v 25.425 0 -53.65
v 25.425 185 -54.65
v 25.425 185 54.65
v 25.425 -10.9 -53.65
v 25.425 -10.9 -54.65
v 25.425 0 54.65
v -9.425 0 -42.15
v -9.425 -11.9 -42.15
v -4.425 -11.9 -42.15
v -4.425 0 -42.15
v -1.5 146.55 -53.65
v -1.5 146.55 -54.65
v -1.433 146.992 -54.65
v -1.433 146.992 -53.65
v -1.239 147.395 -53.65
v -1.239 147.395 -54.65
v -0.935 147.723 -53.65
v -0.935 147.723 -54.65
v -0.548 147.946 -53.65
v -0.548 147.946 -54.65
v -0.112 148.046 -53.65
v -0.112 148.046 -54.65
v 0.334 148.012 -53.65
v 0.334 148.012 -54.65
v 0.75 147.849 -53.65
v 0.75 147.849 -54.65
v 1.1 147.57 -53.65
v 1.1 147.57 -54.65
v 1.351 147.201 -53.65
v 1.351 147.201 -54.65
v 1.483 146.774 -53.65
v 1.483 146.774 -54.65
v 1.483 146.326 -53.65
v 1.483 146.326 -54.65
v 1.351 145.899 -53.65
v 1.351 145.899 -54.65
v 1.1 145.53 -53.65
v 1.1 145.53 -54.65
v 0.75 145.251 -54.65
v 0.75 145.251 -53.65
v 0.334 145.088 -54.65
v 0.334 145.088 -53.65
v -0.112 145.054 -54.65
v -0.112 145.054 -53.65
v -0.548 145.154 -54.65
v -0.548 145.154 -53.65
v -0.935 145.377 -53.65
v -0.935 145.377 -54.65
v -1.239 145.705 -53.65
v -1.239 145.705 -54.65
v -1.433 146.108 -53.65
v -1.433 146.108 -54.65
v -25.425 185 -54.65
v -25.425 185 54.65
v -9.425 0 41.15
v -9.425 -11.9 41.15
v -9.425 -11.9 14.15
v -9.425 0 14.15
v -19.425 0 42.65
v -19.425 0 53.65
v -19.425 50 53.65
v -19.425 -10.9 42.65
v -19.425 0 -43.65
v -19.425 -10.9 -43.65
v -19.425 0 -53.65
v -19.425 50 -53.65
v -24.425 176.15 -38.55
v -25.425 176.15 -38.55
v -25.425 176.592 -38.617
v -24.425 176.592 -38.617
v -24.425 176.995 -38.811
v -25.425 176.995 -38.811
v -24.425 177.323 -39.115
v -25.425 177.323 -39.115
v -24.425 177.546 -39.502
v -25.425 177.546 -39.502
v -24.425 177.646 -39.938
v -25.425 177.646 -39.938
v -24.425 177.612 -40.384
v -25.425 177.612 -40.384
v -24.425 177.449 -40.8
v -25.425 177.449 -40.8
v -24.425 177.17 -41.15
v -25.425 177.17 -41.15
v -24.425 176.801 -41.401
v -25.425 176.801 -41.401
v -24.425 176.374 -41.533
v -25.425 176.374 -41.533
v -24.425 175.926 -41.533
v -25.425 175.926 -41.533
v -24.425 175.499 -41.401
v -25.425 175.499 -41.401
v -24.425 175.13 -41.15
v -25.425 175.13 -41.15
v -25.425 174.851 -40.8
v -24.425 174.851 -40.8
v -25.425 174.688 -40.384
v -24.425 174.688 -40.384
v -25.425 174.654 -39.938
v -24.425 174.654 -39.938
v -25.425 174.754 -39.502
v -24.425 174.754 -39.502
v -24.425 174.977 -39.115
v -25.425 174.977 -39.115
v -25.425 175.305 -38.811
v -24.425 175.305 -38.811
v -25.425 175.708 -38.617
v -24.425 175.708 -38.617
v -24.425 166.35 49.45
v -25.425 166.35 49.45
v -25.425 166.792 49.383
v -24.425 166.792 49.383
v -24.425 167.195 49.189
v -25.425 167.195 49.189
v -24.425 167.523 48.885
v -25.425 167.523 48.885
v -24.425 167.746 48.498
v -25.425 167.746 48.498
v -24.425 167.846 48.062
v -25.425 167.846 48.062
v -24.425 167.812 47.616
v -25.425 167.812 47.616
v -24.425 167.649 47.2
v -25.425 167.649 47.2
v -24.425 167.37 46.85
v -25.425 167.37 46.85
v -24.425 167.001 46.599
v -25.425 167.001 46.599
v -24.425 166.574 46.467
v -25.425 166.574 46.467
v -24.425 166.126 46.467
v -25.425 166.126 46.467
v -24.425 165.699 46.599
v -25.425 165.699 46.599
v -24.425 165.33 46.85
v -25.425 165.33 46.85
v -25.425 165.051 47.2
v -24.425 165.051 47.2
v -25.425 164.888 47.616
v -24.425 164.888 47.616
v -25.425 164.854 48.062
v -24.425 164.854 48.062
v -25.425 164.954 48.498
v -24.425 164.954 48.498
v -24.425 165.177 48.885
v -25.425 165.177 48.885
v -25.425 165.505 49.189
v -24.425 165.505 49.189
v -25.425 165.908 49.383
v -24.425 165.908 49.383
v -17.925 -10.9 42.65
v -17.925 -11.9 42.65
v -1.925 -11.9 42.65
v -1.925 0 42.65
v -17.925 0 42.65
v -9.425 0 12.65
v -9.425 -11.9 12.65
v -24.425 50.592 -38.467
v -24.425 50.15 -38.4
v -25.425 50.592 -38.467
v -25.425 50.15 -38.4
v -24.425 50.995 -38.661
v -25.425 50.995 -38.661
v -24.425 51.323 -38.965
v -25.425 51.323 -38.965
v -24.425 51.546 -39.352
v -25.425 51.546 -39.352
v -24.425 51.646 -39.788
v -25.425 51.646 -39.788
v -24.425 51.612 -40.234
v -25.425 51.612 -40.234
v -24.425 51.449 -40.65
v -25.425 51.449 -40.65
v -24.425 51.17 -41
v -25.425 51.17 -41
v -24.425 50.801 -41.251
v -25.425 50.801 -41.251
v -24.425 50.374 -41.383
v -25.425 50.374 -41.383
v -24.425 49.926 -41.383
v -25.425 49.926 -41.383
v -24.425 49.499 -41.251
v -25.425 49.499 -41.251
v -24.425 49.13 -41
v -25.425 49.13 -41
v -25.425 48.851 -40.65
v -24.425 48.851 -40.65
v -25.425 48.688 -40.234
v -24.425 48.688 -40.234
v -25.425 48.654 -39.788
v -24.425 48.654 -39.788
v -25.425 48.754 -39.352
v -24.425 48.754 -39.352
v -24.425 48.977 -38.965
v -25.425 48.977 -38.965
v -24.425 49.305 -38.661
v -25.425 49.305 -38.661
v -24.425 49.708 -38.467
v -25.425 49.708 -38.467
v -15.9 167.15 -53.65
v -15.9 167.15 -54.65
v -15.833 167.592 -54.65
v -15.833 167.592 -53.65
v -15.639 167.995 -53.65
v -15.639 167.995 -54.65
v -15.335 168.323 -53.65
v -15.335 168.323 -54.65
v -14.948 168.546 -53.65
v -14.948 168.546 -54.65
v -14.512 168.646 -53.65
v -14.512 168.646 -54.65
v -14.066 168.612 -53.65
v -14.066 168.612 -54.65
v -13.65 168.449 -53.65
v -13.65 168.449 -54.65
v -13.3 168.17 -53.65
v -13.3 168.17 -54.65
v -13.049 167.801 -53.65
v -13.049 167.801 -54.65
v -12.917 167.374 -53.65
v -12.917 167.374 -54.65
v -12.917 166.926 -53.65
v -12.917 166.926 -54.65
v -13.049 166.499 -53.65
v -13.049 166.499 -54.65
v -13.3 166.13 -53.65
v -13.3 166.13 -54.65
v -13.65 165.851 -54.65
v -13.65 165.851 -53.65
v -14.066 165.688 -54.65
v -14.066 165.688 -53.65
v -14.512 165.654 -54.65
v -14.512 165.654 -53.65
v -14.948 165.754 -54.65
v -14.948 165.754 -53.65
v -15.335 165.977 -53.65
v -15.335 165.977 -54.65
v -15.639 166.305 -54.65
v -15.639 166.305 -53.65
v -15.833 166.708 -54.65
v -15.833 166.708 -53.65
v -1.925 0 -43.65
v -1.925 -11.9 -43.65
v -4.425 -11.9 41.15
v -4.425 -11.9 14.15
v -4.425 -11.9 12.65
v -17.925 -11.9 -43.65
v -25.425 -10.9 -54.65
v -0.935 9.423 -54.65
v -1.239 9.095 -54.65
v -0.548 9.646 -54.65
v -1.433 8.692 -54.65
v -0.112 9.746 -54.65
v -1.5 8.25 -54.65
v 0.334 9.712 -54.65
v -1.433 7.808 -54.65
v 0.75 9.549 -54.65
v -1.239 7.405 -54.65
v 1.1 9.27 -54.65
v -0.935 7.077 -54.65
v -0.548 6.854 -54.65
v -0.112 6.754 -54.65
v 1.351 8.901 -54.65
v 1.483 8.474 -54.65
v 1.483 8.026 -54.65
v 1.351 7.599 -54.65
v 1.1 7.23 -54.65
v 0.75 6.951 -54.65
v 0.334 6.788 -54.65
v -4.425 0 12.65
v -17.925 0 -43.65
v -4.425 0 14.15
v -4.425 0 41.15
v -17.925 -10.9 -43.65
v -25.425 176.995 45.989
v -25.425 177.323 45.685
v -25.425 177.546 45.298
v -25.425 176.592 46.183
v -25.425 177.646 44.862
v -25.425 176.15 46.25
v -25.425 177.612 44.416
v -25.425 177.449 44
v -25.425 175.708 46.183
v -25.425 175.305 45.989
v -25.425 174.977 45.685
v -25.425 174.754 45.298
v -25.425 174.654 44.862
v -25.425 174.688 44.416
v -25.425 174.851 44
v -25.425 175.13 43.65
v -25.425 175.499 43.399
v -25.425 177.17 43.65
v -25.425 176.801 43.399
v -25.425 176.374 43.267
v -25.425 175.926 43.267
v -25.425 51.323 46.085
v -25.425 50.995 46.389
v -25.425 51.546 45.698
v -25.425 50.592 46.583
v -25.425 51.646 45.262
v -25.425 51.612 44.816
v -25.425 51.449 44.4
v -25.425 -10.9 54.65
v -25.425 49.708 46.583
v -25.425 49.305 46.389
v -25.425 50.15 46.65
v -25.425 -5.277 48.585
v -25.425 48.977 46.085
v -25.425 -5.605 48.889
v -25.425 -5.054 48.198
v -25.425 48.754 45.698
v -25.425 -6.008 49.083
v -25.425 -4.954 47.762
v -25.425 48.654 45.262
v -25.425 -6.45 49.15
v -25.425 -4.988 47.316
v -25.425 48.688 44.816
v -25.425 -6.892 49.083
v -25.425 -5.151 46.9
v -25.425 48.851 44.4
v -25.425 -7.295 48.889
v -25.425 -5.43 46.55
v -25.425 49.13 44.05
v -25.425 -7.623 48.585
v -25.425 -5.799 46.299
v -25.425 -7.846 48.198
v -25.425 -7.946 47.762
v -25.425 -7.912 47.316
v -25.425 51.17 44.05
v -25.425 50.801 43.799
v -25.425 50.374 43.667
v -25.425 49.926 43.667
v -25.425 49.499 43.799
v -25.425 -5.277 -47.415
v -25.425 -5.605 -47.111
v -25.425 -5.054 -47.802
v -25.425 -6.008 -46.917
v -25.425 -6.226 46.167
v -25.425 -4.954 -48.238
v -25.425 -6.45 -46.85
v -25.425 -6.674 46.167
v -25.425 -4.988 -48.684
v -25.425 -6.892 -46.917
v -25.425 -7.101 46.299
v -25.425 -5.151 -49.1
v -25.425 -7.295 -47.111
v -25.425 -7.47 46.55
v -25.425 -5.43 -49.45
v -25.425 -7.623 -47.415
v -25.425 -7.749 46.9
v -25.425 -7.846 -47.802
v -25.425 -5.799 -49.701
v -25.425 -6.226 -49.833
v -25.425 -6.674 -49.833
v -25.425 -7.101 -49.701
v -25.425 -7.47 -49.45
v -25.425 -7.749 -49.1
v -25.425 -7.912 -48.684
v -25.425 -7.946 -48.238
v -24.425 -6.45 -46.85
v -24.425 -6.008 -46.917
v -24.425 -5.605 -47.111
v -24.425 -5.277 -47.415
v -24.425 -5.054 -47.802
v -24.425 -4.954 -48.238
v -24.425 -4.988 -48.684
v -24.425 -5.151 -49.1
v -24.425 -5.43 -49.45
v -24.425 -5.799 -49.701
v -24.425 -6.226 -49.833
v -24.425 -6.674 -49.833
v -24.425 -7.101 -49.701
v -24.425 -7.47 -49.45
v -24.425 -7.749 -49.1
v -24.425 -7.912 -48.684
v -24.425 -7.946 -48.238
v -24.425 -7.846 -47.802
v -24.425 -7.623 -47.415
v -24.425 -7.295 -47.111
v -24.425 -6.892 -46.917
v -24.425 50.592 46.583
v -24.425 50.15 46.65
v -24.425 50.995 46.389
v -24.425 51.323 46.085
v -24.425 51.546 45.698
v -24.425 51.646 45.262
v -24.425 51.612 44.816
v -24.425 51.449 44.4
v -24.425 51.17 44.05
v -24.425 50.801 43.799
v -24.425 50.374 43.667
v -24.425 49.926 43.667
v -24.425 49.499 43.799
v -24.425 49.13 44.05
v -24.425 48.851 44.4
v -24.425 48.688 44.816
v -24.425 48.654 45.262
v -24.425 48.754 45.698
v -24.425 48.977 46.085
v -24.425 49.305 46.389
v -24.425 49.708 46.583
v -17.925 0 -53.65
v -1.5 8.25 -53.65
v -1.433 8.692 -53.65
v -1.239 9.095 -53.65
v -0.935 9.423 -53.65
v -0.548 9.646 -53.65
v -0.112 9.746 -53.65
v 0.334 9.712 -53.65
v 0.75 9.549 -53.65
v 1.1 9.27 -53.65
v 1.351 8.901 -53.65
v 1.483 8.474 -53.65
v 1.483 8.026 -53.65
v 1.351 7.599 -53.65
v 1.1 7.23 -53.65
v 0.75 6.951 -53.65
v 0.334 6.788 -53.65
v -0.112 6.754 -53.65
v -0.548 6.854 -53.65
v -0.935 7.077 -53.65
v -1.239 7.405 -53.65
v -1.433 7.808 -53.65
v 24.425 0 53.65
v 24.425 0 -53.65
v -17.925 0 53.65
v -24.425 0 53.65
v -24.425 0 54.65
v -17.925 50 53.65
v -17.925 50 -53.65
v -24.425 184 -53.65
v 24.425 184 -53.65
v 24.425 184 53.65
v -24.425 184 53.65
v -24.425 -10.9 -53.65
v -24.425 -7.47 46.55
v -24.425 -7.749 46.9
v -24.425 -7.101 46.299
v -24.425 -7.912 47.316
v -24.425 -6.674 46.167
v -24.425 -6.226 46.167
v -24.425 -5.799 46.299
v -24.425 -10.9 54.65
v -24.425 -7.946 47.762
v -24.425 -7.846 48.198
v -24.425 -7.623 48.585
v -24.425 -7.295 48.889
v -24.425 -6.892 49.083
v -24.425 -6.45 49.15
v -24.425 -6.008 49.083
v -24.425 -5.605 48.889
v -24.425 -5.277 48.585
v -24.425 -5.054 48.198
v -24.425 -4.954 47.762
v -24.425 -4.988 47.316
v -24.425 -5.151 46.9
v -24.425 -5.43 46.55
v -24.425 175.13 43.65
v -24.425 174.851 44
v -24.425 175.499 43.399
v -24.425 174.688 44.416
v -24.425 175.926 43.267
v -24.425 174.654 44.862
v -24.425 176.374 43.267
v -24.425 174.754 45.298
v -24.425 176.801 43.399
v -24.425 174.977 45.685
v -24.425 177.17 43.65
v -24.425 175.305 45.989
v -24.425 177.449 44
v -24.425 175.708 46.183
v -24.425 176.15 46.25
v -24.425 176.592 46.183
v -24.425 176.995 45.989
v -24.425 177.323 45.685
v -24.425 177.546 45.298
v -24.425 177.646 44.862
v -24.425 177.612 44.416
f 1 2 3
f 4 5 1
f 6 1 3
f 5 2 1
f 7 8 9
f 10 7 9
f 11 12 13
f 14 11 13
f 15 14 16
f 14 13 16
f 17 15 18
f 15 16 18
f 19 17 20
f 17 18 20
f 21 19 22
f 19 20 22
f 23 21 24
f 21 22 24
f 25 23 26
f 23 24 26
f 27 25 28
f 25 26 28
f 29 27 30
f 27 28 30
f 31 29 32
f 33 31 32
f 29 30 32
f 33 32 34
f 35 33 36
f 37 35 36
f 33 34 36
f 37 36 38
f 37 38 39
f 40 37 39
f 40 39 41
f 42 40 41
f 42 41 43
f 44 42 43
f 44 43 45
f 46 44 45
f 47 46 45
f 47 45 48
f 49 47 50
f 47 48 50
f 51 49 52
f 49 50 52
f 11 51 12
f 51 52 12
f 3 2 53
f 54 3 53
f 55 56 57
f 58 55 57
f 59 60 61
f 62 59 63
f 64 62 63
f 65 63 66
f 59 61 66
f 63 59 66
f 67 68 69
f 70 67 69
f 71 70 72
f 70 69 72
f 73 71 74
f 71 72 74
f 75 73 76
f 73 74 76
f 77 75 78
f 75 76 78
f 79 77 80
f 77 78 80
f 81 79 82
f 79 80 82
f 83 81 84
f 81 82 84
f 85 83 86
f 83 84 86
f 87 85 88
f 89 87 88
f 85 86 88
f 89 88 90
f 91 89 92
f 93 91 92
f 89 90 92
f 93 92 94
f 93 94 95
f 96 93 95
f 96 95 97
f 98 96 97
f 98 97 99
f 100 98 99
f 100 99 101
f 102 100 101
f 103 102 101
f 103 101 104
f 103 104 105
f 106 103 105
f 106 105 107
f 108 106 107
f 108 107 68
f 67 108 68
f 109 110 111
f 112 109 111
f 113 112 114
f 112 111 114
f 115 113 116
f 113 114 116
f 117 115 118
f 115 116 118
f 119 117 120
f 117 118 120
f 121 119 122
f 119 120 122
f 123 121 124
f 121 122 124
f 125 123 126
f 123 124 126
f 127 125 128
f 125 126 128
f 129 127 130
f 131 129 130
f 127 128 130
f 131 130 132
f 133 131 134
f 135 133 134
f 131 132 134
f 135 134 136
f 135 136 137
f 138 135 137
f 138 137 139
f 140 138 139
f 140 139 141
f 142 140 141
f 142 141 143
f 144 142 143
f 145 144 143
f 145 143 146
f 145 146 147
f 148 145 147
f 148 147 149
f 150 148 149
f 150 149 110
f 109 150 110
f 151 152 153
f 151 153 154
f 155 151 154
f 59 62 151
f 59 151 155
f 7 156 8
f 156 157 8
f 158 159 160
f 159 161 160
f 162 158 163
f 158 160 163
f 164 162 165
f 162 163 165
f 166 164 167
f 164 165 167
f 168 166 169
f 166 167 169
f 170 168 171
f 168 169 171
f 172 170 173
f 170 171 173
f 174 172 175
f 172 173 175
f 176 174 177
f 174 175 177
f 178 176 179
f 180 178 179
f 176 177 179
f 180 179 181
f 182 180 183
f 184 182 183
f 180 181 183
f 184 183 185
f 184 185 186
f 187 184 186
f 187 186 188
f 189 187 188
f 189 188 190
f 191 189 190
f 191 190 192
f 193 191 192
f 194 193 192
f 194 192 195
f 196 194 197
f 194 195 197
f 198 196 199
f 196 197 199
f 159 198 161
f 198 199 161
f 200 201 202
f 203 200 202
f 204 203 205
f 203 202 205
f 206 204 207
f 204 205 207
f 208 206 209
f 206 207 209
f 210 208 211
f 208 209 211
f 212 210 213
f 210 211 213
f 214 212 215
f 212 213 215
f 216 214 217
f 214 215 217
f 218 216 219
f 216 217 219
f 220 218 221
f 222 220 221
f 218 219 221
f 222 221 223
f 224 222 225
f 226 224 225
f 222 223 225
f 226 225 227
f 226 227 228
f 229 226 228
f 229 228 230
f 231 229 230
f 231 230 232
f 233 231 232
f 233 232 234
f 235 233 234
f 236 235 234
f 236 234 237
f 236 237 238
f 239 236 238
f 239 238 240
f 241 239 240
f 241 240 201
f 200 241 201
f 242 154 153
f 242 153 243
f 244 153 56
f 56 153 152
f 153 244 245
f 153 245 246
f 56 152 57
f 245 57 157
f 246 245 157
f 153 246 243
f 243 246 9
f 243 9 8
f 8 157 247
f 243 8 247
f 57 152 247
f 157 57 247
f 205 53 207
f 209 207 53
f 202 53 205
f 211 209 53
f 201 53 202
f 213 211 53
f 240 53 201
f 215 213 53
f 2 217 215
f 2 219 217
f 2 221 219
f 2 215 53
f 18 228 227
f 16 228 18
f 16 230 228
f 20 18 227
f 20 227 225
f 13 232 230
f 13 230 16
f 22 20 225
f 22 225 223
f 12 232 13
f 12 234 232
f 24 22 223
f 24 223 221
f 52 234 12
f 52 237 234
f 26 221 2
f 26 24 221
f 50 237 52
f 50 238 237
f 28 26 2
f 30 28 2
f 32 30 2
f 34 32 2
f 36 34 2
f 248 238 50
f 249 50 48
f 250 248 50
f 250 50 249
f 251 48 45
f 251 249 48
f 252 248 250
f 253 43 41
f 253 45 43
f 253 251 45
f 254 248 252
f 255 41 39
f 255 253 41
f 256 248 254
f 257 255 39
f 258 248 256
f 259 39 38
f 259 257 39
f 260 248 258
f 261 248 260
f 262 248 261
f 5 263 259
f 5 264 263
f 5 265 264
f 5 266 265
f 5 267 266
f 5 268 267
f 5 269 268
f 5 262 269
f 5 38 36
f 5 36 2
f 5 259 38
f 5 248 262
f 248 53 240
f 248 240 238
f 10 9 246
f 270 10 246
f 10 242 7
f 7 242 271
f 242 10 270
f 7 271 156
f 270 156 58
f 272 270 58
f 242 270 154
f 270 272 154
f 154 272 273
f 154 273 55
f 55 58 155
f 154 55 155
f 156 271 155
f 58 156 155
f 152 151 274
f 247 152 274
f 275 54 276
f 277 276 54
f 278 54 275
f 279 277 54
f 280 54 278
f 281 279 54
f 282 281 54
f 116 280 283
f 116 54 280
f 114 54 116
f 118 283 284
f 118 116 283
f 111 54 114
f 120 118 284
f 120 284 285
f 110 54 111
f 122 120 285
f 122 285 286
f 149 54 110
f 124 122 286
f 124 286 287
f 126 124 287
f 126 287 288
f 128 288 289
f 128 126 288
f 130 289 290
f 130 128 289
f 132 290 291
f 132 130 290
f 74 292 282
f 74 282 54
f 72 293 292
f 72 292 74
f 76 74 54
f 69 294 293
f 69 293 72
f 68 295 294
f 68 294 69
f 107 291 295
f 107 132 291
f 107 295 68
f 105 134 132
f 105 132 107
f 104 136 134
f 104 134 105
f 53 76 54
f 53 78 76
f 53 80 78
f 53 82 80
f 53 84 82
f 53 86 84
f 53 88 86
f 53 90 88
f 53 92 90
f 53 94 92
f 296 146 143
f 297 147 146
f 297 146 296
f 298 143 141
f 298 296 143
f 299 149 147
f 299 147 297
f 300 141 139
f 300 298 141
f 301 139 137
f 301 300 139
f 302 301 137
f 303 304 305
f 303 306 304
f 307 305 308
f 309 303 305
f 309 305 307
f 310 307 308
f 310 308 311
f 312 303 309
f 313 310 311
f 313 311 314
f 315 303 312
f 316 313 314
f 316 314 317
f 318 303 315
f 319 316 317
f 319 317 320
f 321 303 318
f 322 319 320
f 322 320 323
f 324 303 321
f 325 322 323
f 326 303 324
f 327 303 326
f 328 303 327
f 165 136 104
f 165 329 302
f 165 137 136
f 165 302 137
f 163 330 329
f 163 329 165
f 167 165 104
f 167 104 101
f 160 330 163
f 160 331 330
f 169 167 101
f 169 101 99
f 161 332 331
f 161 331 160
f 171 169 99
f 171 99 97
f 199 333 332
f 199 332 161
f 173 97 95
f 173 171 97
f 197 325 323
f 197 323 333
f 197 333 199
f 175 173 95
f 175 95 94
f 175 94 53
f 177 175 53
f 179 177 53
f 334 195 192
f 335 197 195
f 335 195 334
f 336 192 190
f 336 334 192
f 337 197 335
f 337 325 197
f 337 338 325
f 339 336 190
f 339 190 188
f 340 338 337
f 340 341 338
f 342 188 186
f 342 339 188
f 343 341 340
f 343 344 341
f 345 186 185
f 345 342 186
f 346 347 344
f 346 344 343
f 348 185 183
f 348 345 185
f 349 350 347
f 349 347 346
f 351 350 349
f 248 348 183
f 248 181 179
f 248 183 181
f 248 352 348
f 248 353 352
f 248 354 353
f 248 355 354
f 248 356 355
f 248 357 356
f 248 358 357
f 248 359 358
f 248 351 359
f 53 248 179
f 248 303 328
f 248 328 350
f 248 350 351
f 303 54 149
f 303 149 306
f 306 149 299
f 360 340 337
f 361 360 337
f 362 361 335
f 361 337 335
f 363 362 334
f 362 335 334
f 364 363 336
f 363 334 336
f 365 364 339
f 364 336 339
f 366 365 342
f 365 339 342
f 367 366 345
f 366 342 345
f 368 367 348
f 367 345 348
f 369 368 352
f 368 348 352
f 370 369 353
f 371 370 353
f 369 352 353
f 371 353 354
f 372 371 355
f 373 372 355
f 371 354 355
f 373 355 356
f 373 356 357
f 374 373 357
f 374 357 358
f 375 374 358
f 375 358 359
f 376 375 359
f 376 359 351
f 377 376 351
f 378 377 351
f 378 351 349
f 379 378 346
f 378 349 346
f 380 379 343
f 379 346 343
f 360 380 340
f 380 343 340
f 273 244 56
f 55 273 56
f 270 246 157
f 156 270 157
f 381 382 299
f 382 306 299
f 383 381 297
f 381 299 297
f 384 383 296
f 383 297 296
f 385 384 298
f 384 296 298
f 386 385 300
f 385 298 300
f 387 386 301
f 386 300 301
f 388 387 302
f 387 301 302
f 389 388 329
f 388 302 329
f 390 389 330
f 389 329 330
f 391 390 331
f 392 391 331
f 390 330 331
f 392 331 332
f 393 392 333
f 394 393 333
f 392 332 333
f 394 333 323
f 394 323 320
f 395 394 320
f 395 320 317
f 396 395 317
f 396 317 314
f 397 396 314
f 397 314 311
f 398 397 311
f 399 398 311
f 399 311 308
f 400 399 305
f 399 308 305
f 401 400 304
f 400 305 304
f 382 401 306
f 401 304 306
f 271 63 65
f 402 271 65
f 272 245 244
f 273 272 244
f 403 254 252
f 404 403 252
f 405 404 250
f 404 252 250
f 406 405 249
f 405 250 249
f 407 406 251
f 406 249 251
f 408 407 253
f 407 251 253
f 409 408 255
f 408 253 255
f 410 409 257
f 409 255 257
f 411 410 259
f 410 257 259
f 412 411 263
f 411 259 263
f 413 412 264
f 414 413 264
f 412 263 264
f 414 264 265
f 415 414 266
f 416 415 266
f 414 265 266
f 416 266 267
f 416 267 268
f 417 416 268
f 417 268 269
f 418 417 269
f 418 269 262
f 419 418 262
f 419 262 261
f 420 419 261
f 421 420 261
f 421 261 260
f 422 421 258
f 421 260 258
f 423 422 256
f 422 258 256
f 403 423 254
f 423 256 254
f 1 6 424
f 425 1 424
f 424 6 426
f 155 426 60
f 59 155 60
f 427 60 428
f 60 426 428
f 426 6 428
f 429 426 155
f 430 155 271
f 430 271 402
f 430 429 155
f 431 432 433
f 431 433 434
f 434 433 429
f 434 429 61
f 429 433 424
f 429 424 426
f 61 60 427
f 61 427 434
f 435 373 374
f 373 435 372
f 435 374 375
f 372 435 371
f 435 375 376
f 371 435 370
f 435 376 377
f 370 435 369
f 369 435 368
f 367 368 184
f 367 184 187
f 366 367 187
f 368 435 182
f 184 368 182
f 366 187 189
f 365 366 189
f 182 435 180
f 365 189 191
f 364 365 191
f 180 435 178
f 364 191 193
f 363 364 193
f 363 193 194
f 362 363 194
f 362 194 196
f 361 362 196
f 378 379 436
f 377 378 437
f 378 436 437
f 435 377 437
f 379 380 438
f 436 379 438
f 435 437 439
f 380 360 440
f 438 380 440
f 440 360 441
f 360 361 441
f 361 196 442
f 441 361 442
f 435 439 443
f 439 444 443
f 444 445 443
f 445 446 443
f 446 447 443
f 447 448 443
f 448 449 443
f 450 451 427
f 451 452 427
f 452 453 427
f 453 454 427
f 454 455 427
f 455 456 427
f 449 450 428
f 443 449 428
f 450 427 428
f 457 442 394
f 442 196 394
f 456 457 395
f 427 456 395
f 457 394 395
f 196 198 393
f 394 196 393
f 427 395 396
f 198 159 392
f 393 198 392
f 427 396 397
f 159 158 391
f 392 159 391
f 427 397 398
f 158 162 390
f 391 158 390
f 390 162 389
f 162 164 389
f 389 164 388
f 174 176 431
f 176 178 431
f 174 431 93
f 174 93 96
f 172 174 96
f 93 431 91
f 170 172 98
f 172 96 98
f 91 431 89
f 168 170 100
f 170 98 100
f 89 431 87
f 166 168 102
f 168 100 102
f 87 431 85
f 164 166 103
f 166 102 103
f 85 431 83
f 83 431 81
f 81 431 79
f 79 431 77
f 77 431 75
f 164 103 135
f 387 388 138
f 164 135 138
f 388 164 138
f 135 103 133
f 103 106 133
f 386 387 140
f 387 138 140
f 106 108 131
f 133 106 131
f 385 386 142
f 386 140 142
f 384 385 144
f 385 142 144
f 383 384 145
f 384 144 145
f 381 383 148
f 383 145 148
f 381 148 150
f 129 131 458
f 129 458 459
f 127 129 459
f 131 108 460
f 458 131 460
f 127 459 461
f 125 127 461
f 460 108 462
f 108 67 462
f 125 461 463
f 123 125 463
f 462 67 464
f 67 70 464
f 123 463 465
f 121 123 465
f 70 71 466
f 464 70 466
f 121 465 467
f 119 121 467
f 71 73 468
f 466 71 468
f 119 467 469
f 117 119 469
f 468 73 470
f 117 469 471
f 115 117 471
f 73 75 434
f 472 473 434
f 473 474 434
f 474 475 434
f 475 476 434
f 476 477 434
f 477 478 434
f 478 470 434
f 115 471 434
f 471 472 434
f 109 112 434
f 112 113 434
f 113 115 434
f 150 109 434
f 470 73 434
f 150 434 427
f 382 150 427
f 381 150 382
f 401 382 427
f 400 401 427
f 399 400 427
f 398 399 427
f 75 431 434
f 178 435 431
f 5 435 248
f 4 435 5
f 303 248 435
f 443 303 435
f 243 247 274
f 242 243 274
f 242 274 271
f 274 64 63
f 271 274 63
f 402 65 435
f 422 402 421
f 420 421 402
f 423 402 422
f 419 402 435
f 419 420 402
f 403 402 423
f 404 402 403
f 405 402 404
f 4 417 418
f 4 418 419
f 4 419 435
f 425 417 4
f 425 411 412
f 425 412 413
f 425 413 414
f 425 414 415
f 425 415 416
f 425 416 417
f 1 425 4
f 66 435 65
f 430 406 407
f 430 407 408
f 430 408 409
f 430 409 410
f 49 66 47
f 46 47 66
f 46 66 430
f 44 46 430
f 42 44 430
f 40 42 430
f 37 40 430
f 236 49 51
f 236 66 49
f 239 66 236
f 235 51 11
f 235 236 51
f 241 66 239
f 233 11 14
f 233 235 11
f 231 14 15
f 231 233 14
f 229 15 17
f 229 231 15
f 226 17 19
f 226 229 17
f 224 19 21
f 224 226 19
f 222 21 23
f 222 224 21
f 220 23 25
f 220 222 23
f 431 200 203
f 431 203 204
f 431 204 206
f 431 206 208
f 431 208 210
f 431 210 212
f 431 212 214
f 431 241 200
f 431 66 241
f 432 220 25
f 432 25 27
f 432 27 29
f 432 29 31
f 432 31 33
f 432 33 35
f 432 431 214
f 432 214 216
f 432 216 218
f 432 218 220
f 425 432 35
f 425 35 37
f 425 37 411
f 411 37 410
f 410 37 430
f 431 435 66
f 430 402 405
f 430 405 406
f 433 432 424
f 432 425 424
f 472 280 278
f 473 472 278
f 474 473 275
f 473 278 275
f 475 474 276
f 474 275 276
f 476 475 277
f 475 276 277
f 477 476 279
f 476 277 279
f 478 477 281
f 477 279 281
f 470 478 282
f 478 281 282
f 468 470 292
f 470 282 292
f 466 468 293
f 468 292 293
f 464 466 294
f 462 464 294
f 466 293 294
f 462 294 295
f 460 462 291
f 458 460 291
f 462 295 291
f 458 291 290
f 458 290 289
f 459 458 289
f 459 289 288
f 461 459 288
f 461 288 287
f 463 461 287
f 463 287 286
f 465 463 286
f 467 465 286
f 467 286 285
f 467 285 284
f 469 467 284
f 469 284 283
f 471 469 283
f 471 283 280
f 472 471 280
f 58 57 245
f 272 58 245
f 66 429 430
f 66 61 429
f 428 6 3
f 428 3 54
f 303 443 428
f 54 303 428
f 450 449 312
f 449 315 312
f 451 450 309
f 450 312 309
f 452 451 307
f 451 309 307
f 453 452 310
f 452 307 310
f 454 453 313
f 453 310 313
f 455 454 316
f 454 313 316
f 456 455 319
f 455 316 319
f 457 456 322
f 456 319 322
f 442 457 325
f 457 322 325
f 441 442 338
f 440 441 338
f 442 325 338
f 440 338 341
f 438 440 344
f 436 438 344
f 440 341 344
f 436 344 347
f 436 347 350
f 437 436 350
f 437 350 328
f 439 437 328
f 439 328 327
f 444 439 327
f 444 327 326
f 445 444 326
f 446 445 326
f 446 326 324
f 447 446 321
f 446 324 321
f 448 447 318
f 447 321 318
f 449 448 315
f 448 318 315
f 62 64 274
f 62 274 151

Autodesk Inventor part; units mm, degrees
ref_plane "YZ Plane" through (0, 0, 0) normal (1, 0, 0) x (0, 1, 0)
ref_plane "XZ Plane" through (0, 0, 0) normal (0, 1, 0) x (-1, 0, 0)
ref_plane "XY Plane" through (0, 0, 0) normal (0, 0, 1) x (1, 0, 0)
sketch "Sketch1" plane through (0, 0, 0) normal (0, 1, 0) x (-1, 0, 0)
  line L0 (-25.425, 54.65) -> (25.425, 54.65)
  line L1 (25.425, 54.65) -> (25.425, -54.65)
  line L2 (25.425, -54.65) -> (-25.425, -54.65)
  line L3 (-25.425, -54.65) -> (-25.425, 54.65)
  line L4 (-25.425, 54.65) -> (25.425, -54.65) construction
  line L5 (25.425, 54.65) -> (-25.425, -54.65) construction
  point P0 (0, 0)
  dimension "d0" = 109.3
  dimension "d1" = 50.85
extrude "Extrusion1" add sketch "Sketch1" along normal blind 185
shell "Shell1" thickness 1 removed faces 1 at (8.475, 0, 18.2167)
sketch "Sketch2" plane through (0, 0, 0) normal (0, -1, 0) x (1, 0, 0)
  line L0 (-24.425, -53.65) -> (-24.425, 53.65) projected
  line L1 (-24.425, 53.65) -> (24.425, 53.65) projected
  line L2 (24.425, 53.65) -> (24.425, -53.65) projected
  line L3 (24.425, -53.65) -> (-24.425, -53.65) projected
  line L4 (25.425, 54.65) -> (-25.425, 54.65) projected
  line L5 (-25.425, 54.65) -> (-25.425, -54.65) projected
  line L6 (-25.425, -54.65) -> (25.425, -54.65) projected
  line L7 (25.425, -54.65) -> (25.425, 54.65) projected
  line L8 (-24.425, 53.65) -> (-24.425, 54.65)
  line L9 (25.425, 54.65) -> (-25.425, 54.65) projected
  line L10 (24.425, 53.65) -> (24.425, -53.65) projected
  line L11 (24.425, -53.65) -> (25.425, -53.65)
  line L12 (25.425, -54.65) -> (25.425, 54.65) projected
  point P0 (0, 0)
extrude "Extrusion2" add sketch "Sketch2" along normal blind 10.9 contours L3 L11 L7 L6 L5 L4 L8 L0
sketch "Sketch3" plane through (25.425, 185, -54.65) normal (0, 0, -1) x (-1, 0, 0)
  line L0 (0, -176.75) -> (50.85, -176.75) construction
  line L1 (50.85, 0) -> (50.85, -195.9) construction
  circle A0 centre (25.425, -176.75) radius 1.5
  line L2 (50.85, -195.9) -> (0, -195.9) projected
  line L3 (0, 0) -> (0, -195.9) projected
  line L4 (25.425, -176.75) -> (25.425, -38.45) construction
  circle A1 centre (25.425, -38.45) radius 1.5
  line L5 (25.425, -38.45) -> (39.825, -38.45) construction
  line L6 (39.825, -38.45) -> (39.825, -17.85) construction
  circle A2 centre (39.825, -17.85) radius 1.5
  point P0 (25.425, -185)
  dimension "d7" = 19.15
  dimension "d8" = 3
  dimension "d9" = 138.3
  dimension "d10" = 3
  dimension "d11" = 14.4
  dimension "d12" = 20.6
  dimension "d13" = 3
extrude "Extrusion3" cut sketch "Sketch3" against normal up to surface (1 mm away)
sketch "Sketch4" plane through (-25.425, 185, -54.65) normal (-1, 0, 0) x (0, 0, 1)
  line L0 (0, -191.45) -> (109.3, -191.45) construction
  line L1 (109.3, 0) -> (109.3, -195.9) construction
  line L2 (109.3, -195.9) -> (0, -195.9) construction
  line L3 (0, 0) -> (0, -195.9) construction
  circle A0 centre (6.3, -191.45) radius 1.5
  circle A1 centre (102.3, -191.45) radius 1.5
  line L4 (0, -134.85) -> (109.3, -134.85) construction
  circle A2 centre (14.75, -134.85) radius 1.5
  circle A3 centre (99.8, -134.85) radius 1.5
  line L5 (0, -18.65) -> (109.3, -18.65) construction
  circle A4 centre (102.6, -18.65) radius 1.5
  line L6 (0, -8.85) -> (109.3, -8.85) construction
  circle A5 centre (14.6, -8.85) radius 1.5
  circle A6 centre (99.4, -8.85) radius 1.5
  point P0 (54.65, -185)
  dimension "d16" = 4.45
  dimension "d17" = 7
  dimension "d18" = 3
  dimension "d19" = 6.3
  dimension "d20" = 3
  dimension "d21" = 56.6
  dimension "d22" = 14.75
  dimension "d23" = 9.5
  dimension "d24" = 3
  dimension "d25" = 3
  dimension "d26" = 116.2
  dimension "d27" = 6.7
  dimension "d28" = 3
  dimension "d29" = 9.8
  dimension "d30" = 9.9
  dimension "d31" = 3
  dimension "d32" = 14.6
  dimension "d33" = 3
extrude "Extrusion4" cut sketch "Sketch4" against normal up to surface (1 mm away)
ref_plane "Work Plane1" through (-19.425, 0, 53.65) normal (1, 0, 0) x (0, 0, -1)
sketch "Sketch5" plane through (-19.425, 0, 53.65) normal (1, 0, 0) x (0, 0, -1)
  line L0 (107.3, -10.9) -> (-1, -10.9) projected
  line L1 (97.3, -10.9) -> (97.3, 0)
  line L2 (107.3, 0) -> (107.3, -10.9) projected
  line L3 (11, -10.9) -> (11, 0)
  line L4 (-1, 0) -> (-1, -10.9) projected
  line L5 (11, -10.9) -> (97.3, -10.9)
  line L6 (11, 0) -> (-1, 0)
  line L7 (-1, 185) -> (-1, -10.9) projected
  line L8 (97.3, 0) -> (107.3, 0)
  line L9 (107.3, -10.9) -> (107.3, 184) projected
  line L10 (-1, 0) -> (11, 0)
  line L11 (0, 0) -> (0, 184) projected
  line L12 (0, 0) -> (0, 50)
  line L13 (0, 50) -> (107.3, 50)
  line L14 (107.3, 50) -> (107.3, 0)
  point P0 (53.65, 0)
  dimension "d36" = 10
  dimension "d37" = 12
  dimension "d38" = 50
extrude "Extrusion5" add sketch "Sketch5" along normal blind 1.5 contours L0 L3 L6 L11 L13 L9 L8 L1
sketch "Sketch6" plane through (-17.925, 0, 53.65) normal (1, 0, 0) x (0, 0, -1)
  line L0 (97.3, 0) -> (107.3, 0) projected
  line L1 (97.3, 0) -> (11, 0)
  line L2 (11, 0) -> (11, -11.9)
  line L3 (11, -11.9) -> (97.3, -11.9)
  line L4 (97.3, -11.9) -> (97.3, 0)
  line L5 (11, 0) -> (11, -10.9) projected
  line L6 (11, -10.9) -> (97.3, -10.9) projected
  point P0 (53.65, 0)
  dimension "d42" = 1
extrude "Extrusion6" add sketch "Sketch6" along normal blind 16
sketch "Sketch7" plane through (-17.925, -11.9, -43.65) normal (0, -1, 0) x (1, 0, 0)
  line L0 (13.5, 84.8) -> (8.5, 84.8)
  line L1 (8.5, 84.8) -> (8.5, 57.8)
  line L2 (8.5, 57.8) -> (13.5, 57.8)
  line L3 (13.5, 57.8) -> (13.5, 84.8)
  line L4 (0, 86.3) -> (16, 86.3) projected
  line L5 (16, 86.3) -> (16, 0) projected
  line L6 (0, 86.3) -> (0, 0) projected
  line L7 (13.5, 56.3) -> (8.5, 56.3)
  line L8 (8.5, 56.3) -> (8.5, 1.5)
  line L9 (8.5, 1.5) -> (13.5, 1.5)
  line L10 (13.5, 1.5) -> (13.5, 56.3)
  line L11 (0, 0) -> (16, 0) projected
  point P0 (17.925, 43.65)
  dimension "d45" = 1.5
  dimension "d46" = 2.5
  dimension "d47" = 27
  dimension "d48" = 8.5
  dimension "d49" = 1.5
  dimension "d50" = 1.5
extrude "Extrusion7" cut sketch "Sketch7" against normal blind 16 contours L3 L2 L1 L0 | L10 L9 L8 L7
ref_plane "Work Plane2" through (0, -35.9, 0) normal (0, -1, 0) x (1, 0, 0)
ref_plane "Work Plane3" through (-25.425, 185, 0) normal (0, 0, 1) x (1, 0, 0)
properties part number "PSU"
